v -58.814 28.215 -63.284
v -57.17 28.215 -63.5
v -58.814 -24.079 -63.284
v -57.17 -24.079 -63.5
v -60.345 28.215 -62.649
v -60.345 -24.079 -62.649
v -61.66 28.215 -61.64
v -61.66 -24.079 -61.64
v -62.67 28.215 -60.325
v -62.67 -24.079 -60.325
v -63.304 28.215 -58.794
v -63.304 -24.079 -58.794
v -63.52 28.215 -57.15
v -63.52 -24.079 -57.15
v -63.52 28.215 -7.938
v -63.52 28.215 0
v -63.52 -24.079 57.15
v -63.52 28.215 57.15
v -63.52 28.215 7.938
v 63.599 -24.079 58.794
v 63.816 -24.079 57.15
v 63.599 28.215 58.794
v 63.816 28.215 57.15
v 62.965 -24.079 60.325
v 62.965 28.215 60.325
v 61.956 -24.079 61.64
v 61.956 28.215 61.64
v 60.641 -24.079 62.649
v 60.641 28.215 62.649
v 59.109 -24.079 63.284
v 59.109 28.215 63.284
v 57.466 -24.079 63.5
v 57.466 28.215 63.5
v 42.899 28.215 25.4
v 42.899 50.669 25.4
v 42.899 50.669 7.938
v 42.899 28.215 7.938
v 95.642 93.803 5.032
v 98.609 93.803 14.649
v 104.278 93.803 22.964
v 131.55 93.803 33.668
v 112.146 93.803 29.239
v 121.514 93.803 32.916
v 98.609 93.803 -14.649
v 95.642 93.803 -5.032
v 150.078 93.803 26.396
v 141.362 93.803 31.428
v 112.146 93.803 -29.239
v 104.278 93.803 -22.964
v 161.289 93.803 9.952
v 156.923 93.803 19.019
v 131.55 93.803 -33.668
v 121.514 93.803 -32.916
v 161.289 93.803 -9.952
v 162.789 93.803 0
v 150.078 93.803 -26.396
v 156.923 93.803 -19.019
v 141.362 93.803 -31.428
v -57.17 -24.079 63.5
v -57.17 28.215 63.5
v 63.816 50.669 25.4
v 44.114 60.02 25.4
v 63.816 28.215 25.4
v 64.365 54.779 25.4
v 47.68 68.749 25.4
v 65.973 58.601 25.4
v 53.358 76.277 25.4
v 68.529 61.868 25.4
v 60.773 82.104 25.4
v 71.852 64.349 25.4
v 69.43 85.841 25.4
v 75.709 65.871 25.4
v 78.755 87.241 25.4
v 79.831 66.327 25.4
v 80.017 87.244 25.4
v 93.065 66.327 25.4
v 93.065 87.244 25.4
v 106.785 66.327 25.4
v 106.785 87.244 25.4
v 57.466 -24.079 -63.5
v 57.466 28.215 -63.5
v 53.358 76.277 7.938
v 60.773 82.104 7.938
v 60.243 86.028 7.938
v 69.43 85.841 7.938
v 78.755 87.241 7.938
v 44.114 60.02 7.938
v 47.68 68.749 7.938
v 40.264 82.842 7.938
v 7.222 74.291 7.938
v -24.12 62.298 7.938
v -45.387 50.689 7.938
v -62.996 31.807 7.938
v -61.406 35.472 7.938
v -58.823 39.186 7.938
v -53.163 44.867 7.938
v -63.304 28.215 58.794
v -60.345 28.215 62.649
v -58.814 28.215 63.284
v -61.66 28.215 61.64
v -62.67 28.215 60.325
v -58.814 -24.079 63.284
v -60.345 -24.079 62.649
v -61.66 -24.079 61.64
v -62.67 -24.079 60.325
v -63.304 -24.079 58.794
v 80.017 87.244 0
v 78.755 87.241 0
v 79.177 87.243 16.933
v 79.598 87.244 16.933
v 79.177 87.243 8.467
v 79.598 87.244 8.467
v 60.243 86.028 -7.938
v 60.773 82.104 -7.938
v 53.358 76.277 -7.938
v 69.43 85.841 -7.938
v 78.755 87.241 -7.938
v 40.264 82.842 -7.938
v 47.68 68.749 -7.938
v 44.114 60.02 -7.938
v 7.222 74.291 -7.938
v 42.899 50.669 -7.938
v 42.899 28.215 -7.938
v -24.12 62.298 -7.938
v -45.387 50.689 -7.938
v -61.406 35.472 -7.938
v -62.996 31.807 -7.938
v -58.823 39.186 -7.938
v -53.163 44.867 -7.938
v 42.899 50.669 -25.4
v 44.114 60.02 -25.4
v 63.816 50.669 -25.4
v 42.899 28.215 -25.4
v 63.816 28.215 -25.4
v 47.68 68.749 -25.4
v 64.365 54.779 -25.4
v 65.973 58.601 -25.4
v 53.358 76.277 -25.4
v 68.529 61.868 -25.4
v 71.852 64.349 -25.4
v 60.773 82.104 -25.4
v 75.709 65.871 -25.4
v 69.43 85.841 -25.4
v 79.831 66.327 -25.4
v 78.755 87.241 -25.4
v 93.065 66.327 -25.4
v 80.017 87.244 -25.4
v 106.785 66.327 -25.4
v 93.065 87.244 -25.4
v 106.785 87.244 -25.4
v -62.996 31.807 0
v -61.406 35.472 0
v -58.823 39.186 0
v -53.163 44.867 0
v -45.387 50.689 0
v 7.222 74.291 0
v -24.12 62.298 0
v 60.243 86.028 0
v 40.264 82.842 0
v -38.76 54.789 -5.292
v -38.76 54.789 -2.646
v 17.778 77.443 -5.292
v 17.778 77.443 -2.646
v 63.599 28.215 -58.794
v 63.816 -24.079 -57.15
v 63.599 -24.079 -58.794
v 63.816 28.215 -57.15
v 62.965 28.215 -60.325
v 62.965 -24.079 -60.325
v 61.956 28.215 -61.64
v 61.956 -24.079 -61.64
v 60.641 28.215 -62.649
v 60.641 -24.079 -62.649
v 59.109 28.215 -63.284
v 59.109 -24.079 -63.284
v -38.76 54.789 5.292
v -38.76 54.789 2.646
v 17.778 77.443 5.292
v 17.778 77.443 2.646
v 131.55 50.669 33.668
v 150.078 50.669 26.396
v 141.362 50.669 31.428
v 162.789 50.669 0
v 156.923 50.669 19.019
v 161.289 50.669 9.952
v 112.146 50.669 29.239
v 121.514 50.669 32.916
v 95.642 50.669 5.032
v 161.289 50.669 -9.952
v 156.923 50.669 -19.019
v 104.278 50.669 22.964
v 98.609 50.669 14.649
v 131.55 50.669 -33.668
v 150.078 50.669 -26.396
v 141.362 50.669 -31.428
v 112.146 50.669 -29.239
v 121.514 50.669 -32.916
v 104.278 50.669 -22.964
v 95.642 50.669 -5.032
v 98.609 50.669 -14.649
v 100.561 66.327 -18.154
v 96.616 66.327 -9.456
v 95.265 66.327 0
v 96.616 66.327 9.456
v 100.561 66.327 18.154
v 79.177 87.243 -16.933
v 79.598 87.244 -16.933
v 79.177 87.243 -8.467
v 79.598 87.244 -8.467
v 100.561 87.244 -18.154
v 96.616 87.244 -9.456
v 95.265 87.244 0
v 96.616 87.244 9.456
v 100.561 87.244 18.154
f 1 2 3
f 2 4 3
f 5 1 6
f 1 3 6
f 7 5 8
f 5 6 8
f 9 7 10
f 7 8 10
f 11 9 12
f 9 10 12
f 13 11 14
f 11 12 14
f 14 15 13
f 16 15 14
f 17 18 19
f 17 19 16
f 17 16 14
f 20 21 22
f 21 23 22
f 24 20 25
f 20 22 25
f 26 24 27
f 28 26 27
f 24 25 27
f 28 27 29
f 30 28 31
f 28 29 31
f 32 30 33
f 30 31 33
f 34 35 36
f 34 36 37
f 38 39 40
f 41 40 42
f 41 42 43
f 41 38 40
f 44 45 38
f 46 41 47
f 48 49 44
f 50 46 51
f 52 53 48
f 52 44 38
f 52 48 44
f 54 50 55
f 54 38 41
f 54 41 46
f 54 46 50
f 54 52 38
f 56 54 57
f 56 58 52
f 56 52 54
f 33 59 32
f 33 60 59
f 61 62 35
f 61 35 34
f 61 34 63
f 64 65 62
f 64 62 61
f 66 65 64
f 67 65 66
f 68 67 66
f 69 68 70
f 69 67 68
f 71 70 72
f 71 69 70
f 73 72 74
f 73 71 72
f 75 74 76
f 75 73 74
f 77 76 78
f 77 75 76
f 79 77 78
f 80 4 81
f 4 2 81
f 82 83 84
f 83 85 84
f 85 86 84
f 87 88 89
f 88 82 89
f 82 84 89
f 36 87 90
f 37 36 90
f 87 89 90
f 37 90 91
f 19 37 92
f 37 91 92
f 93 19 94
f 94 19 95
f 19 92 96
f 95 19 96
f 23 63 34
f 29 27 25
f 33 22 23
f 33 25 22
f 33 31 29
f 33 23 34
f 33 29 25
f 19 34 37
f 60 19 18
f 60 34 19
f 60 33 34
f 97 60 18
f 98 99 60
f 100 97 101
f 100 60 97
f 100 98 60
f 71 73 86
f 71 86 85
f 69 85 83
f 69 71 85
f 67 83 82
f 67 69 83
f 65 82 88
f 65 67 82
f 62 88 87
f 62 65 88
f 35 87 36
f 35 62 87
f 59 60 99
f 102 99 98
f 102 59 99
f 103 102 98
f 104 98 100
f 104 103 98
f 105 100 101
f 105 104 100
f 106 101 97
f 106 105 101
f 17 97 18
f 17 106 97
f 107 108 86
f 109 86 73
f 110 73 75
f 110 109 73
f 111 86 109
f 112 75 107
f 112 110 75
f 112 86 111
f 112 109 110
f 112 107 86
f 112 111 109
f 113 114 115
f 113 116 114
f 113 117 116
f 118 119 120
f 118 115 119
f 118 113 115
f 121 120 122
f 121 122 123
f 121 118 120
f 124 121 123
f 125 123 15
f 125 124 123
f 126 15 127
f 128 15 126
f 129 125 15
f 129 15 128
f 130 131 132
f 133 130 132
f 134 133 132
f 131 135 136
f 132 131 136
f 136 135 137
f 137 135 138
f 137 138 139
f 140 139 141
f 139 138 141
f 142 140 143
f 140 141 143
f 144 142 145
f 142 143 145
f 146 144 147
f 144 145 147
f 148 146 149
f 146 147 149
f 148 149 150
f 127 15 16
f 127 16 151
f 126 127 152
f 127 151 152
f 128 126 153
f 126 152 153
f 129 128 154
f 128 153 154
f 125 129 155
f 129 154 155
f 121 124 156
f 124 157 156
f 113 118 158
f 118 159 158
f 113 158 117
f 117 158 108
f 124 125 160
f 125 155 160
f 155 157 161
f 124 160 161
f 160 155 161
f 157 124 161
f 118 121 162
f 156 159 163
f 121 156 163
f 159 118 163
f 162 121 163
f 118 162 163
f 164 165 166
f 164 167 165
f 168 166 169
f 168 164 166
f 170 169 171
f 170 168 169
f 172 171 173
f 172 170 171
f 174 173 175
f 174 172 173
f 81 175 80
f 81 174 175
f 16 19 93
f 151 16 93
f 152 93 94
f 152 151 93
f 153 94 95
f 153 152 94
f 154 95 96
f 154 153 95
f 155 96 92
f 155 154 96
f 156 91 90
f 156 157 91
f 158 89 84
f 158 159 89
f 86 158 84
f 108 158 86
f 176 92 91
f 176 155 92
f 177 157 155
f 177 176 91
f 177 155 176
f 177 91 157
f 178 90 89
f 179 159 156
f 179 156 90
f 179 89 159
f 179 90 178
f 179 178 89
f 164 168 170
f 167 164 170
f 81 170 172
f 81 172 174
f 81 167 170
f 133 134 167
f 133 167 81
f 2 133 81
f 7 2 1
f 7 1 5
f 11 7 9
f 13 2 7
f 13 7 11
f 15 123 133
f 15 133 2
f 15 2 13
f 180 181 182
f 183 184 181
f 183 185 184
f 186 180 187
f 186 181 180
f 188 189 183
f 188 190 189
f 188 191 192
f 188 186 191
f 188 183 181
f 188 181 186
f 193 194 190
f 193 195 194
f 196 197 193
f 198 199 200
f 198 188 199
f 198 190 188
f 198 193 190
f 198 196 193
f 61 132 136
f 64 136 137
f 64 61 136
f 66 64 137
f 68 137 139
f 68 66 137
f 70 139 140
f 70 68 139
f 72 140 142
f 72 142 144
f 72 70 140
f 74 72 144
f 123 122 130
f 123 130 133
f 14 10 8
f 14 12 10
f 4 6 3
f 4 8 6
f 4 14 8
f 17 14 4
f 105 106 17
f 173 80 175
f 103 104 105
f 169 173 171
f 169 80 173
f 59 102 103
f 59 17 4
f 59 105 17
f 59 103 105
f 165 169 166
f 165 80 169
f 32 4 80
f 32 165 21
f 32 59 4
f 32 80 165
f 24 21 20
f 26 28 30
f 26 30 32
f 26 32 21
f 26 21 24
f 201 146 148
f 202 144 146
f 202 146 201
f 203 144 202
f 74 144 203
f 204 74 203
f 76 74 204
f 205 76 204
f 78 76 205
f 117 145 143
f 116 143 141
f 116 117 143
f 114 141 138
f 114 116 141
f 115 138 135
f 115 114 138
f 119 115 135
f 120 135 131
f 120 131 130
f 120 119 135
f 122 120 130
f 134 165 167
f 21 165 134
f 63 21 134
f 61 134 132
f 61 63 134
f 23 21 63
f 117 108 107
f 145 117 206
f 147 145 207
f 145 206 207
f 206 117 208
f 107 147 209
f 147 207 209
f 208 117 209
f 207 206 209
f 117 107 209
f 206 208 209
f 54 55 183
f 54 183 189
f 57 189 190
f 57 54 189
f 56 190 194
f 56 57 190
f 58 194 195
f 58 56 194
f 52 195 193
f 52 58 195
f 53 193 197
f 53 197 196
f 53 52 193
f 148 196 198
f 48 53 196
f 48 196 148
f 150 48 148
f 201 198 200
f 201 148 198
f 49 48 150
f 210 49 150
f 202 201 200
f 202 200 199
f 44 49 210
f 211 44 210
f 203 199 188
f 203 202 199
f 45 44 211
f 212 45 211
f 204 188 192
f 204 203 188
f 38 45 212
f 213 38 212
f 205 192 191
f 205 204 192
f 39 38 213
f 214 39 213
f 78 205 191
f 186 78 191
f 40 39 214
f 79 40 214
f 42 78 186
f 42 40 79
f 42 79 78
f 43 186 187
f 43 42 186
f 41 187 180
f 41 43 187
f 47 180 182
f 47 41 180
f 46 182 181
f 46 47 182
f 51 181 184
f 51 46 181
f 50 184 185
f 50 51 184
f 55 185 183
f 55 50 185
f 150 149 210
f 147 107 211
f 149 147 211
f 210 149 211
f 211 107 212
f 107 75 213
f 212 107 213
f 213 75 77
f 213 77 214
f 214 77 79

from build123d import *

# Parameters (mm, degrees)
F1_DEPTH = 63.5
F0_W     = 35.9624676678
F0_H     = 20.9170691669
F2_DEPTH = 25.4
F3_DEPTH = 7.9375
F5_R     = 6.35


with BuildPart() as f1:
    # F0 (on Top) → F1 (new body, symmetric)
    with BuildSketch(Plane.XY):
        Polygon((42.8987257183, 28.2148495317), (-63.5203495622, 28.2148495317), (-63.5203495622, -24.0786485374), (63.8157948852, -24.0786485374), (63.8157948852, 28.2148495317), align=None)
    extrude(amount=F1_DEPTH, both=True)

    # F0 (on Top) → F2 (join, symmetric)
    with BuildSketch(Plane.XY):
        with BuildLine():
            Line((42.8987257183, 50.6685562432), (42.8987257183, 28.2148495317))
            Line((42.8987257183, 28.2148495317), (63.8157948852, 28.2148495317))
            Line((63.8157948852, 28.2148495317), (63.8157948852, 50.6685562432))
            ThreePointArc((63.8157948852, 50.6685562432), (68.5286535357, 61.8676195433), (79.8310190439, 66.3270577788))
            Line((79.8310190439, 66.3270577788), (93.0647104979, 66.3270577788))
            Line((93.0647104979, 66.3270577788), (93.0647104979, 87.2441269457))
            Line((93.0647104979, 87.2441269457), (80.017371915, 87.2441269457))
            add(Edge.make_bspline(
                [(78.7551044312, 87.2409507038), (79.1779792996, 87.2440139811), (79.5987547257, 87.2450791343), (80.017371915, 87.2441269457)],
                knots=[153.9975424007, 153.9975424007, 153.9975424007, 153.9975424007, 155.2015885192, 155.2015885192, 155.2015885192, 155.2015885192], degree=3))
            ThreePointArc((78.7551044312, 87.2409507038), (53.3581999175, 76.2772458377), (42.8987257183, 50.6685562432))
        make_face()
        with Locations((111.0459443317, 76.7855923623)):
            Rectangle(F0_W, F0_H)
    extrude(amount=F2_DEPTH, both=True)

    # F0 (on Top) → F3 (join, symmetric)
    with BuildSketch(Plane.XY):
        with BuildLine():
            add(Edge.make_bspline(
                [(-63.5203495622, 28.2148495317), (-63.7598756137, 53.7712109703), (24.6693933614, 86.8491574209), (78.7551044312, 87.2409507038)],
                knots=[0, 0, 0, 0, 153.9975424007, 153.9975424007, 153.9975424007, 153.9975424007], degree=3))
            Line((-63.5203495622, 28.2148495317), (42.8987257183, 28.2148495317))
            Line((42.8987257183, 28.2148495317), (42.8987257183, 50.6685562432))
            ThreePointArc((42.8987257183, 50.6685562432), (53.3581999175, 76.2772458377), (78.7551044312, 87.2409507038))
        make_face()
    extrude(amount=F3_DEPTH, both=True)

    # F0 (on Top) → F4 (revolve)
    with BuildSketch(Plane.XY):
        Polygon((129.0271781656, 93.8032977283), (129.0271781656, 87.2441269457), (129.0271781656, 66.3270577788), (129.0271781656, 50.6685562432), (162.7893596888, 50.6685562432), (162.7893596888, 93.8032977283), align=None)
    revolve(axis=Axis((129.0271781656, 72.2359269857, 0), (0, 1, 0)))

    # F5
    f5_edges = [f1.edges().sort_by_distance(p)[0] for p in [
        (-63.52035, 2.0681, -63.5),
        (63.815795, 2.0681, -63.5),
        (-63.52035, 2.0681, 63.5),
        (63.815795, 2.0681, 63.5),
    ]]
    fillet(f5_edges, radius=F5_R)


solid = f1.part
